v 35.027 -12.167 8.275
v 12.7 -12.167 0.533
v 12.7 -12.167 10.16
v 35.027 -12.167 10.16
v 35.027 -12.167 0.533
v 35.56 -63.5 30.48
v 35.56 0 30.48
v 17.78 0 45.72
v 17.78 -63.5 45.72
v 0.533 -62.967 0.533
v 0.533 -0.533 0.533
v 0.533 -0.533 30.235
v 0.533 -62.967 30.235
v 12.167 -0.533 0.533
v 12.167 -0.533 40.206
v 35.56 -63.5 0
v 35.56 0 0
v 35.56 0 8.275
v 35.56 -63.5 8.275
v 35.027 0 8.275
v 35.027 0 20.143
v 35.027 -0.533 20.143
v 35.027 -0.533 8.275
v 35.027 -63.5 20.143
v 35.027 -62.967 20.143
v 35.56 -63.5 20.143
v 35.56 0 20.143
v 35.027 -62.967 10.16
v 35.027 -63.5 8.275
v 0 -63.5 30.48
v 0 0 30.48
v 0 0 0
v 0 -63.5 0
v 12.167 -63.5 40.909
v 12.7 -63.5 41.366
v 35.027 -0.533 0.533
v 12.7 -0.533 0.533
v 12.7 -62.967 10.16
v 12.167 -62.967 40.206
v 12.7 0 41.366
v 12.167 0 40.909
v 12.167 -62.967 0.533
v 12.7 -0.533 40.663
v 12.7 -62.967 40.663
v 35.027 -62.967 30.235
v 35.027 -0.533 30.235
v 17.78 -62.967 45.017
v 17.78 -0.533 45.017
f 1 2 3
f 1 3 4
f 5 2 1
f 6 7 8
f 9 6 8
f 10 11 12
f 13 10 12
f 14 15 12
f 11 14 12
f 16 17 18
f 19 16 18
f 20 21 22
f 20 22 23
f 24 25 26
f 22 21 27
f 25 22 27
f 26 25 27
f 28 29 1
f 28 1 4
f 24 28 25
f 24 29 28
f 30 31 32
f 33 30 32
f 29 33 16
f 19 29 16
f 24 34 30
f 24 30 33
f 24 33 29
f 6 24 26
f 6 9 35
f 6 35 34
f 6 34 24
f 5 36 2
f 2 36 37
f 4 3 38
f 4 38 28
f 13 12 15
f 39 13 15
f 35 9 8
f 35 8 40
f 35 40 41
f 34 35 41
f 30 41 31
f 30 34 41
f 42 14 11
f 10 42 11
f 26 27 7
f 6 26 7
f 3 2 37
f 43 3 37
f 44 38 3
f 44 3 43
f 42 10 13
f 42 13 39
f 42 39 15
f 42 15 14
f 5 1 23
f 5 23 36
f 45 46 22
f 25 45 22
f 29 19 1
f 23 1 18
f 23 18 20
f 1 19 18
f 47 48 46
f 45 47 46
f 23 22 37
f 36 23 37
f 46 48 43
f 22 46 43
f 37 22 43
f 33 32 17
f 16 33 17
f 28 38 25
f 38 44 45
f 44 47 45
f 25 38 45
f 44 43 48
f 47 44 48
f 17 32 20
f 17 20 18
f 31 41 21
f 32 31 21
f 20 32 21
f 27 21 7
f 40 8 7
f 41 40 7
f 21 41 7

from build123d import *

# Parameters (mm, degrees)
F1_DEPTH = 63.5
F3_DEPTH = 0.5334
F5_DEPTH = 0.5334
F7_DEPTH = 63.5
F8_W     = 22.86
F8_H     = 50.8
F9_DEPTH = 10.16


with BuildPart() as f1:
    # F0 (on Front) → F1 (new body)
    with BuildSketch(Plane.XZ):
        Polygon((0, 30.48), (0, 0), (35.56, 0), (35.56, 8.27462), (35.0266, 8.27462), (35.0266, 0.5334), (0.5334, 0.5334), (0.5334, 30.234671), (17.78, 45.017471), (35.0266, 30.234671), (35.0266, 20.142561), (35.56, 20.142561), (35.56, 30.48), (17.78, 45.72), align=None)
    extrude(amount=F1_DEPTH)

    # F2 (on face) → F3 (join)
    with BuildSketch(Plane.XZ.offset(63.5)):
        Polygon((35.0266, 0.5334), (35.0266, 30.234671), (17.78, 45.017471), (0.5334, 30.234671), (0.5334, 0.5334), align=None)
    extrude(amount=-F3_DEPTH)

    # F4 (on face) → F5 (join)
    with BuildSketch(Plane(origin=(0, 0, 0), x_dir=(-1, 0, 0), z_dir=(0, 1, 0))):
        Polygon((-35.0266, 30.234671), (-35.0266, 0.5334), (-0.5334, 0.5334), (-0.5334, 30.234671), (-17.78, 45.017471), align=None)
    extrude(amount=-F5_DEPTH)

    # F6 (on face) → F7 (join)
    with BuildSketch(Plane.XZ.offset(63.5)):
        Polygon((12.1666, 40.908514), (12.1666, 0), (12.7, 0), (12.7, 41.365714), align=None)
    extrude(amount=-F7_DEPTH)

    # F8 (on Top) → F9 (join)
    with BuildSketch(Plane.XY):
        with Locations((23.5966, -37.5666)):
            Rectangle(F8_W, F8_H)
    extrude(amount=F9_DEPTH)


solid = f1.part
